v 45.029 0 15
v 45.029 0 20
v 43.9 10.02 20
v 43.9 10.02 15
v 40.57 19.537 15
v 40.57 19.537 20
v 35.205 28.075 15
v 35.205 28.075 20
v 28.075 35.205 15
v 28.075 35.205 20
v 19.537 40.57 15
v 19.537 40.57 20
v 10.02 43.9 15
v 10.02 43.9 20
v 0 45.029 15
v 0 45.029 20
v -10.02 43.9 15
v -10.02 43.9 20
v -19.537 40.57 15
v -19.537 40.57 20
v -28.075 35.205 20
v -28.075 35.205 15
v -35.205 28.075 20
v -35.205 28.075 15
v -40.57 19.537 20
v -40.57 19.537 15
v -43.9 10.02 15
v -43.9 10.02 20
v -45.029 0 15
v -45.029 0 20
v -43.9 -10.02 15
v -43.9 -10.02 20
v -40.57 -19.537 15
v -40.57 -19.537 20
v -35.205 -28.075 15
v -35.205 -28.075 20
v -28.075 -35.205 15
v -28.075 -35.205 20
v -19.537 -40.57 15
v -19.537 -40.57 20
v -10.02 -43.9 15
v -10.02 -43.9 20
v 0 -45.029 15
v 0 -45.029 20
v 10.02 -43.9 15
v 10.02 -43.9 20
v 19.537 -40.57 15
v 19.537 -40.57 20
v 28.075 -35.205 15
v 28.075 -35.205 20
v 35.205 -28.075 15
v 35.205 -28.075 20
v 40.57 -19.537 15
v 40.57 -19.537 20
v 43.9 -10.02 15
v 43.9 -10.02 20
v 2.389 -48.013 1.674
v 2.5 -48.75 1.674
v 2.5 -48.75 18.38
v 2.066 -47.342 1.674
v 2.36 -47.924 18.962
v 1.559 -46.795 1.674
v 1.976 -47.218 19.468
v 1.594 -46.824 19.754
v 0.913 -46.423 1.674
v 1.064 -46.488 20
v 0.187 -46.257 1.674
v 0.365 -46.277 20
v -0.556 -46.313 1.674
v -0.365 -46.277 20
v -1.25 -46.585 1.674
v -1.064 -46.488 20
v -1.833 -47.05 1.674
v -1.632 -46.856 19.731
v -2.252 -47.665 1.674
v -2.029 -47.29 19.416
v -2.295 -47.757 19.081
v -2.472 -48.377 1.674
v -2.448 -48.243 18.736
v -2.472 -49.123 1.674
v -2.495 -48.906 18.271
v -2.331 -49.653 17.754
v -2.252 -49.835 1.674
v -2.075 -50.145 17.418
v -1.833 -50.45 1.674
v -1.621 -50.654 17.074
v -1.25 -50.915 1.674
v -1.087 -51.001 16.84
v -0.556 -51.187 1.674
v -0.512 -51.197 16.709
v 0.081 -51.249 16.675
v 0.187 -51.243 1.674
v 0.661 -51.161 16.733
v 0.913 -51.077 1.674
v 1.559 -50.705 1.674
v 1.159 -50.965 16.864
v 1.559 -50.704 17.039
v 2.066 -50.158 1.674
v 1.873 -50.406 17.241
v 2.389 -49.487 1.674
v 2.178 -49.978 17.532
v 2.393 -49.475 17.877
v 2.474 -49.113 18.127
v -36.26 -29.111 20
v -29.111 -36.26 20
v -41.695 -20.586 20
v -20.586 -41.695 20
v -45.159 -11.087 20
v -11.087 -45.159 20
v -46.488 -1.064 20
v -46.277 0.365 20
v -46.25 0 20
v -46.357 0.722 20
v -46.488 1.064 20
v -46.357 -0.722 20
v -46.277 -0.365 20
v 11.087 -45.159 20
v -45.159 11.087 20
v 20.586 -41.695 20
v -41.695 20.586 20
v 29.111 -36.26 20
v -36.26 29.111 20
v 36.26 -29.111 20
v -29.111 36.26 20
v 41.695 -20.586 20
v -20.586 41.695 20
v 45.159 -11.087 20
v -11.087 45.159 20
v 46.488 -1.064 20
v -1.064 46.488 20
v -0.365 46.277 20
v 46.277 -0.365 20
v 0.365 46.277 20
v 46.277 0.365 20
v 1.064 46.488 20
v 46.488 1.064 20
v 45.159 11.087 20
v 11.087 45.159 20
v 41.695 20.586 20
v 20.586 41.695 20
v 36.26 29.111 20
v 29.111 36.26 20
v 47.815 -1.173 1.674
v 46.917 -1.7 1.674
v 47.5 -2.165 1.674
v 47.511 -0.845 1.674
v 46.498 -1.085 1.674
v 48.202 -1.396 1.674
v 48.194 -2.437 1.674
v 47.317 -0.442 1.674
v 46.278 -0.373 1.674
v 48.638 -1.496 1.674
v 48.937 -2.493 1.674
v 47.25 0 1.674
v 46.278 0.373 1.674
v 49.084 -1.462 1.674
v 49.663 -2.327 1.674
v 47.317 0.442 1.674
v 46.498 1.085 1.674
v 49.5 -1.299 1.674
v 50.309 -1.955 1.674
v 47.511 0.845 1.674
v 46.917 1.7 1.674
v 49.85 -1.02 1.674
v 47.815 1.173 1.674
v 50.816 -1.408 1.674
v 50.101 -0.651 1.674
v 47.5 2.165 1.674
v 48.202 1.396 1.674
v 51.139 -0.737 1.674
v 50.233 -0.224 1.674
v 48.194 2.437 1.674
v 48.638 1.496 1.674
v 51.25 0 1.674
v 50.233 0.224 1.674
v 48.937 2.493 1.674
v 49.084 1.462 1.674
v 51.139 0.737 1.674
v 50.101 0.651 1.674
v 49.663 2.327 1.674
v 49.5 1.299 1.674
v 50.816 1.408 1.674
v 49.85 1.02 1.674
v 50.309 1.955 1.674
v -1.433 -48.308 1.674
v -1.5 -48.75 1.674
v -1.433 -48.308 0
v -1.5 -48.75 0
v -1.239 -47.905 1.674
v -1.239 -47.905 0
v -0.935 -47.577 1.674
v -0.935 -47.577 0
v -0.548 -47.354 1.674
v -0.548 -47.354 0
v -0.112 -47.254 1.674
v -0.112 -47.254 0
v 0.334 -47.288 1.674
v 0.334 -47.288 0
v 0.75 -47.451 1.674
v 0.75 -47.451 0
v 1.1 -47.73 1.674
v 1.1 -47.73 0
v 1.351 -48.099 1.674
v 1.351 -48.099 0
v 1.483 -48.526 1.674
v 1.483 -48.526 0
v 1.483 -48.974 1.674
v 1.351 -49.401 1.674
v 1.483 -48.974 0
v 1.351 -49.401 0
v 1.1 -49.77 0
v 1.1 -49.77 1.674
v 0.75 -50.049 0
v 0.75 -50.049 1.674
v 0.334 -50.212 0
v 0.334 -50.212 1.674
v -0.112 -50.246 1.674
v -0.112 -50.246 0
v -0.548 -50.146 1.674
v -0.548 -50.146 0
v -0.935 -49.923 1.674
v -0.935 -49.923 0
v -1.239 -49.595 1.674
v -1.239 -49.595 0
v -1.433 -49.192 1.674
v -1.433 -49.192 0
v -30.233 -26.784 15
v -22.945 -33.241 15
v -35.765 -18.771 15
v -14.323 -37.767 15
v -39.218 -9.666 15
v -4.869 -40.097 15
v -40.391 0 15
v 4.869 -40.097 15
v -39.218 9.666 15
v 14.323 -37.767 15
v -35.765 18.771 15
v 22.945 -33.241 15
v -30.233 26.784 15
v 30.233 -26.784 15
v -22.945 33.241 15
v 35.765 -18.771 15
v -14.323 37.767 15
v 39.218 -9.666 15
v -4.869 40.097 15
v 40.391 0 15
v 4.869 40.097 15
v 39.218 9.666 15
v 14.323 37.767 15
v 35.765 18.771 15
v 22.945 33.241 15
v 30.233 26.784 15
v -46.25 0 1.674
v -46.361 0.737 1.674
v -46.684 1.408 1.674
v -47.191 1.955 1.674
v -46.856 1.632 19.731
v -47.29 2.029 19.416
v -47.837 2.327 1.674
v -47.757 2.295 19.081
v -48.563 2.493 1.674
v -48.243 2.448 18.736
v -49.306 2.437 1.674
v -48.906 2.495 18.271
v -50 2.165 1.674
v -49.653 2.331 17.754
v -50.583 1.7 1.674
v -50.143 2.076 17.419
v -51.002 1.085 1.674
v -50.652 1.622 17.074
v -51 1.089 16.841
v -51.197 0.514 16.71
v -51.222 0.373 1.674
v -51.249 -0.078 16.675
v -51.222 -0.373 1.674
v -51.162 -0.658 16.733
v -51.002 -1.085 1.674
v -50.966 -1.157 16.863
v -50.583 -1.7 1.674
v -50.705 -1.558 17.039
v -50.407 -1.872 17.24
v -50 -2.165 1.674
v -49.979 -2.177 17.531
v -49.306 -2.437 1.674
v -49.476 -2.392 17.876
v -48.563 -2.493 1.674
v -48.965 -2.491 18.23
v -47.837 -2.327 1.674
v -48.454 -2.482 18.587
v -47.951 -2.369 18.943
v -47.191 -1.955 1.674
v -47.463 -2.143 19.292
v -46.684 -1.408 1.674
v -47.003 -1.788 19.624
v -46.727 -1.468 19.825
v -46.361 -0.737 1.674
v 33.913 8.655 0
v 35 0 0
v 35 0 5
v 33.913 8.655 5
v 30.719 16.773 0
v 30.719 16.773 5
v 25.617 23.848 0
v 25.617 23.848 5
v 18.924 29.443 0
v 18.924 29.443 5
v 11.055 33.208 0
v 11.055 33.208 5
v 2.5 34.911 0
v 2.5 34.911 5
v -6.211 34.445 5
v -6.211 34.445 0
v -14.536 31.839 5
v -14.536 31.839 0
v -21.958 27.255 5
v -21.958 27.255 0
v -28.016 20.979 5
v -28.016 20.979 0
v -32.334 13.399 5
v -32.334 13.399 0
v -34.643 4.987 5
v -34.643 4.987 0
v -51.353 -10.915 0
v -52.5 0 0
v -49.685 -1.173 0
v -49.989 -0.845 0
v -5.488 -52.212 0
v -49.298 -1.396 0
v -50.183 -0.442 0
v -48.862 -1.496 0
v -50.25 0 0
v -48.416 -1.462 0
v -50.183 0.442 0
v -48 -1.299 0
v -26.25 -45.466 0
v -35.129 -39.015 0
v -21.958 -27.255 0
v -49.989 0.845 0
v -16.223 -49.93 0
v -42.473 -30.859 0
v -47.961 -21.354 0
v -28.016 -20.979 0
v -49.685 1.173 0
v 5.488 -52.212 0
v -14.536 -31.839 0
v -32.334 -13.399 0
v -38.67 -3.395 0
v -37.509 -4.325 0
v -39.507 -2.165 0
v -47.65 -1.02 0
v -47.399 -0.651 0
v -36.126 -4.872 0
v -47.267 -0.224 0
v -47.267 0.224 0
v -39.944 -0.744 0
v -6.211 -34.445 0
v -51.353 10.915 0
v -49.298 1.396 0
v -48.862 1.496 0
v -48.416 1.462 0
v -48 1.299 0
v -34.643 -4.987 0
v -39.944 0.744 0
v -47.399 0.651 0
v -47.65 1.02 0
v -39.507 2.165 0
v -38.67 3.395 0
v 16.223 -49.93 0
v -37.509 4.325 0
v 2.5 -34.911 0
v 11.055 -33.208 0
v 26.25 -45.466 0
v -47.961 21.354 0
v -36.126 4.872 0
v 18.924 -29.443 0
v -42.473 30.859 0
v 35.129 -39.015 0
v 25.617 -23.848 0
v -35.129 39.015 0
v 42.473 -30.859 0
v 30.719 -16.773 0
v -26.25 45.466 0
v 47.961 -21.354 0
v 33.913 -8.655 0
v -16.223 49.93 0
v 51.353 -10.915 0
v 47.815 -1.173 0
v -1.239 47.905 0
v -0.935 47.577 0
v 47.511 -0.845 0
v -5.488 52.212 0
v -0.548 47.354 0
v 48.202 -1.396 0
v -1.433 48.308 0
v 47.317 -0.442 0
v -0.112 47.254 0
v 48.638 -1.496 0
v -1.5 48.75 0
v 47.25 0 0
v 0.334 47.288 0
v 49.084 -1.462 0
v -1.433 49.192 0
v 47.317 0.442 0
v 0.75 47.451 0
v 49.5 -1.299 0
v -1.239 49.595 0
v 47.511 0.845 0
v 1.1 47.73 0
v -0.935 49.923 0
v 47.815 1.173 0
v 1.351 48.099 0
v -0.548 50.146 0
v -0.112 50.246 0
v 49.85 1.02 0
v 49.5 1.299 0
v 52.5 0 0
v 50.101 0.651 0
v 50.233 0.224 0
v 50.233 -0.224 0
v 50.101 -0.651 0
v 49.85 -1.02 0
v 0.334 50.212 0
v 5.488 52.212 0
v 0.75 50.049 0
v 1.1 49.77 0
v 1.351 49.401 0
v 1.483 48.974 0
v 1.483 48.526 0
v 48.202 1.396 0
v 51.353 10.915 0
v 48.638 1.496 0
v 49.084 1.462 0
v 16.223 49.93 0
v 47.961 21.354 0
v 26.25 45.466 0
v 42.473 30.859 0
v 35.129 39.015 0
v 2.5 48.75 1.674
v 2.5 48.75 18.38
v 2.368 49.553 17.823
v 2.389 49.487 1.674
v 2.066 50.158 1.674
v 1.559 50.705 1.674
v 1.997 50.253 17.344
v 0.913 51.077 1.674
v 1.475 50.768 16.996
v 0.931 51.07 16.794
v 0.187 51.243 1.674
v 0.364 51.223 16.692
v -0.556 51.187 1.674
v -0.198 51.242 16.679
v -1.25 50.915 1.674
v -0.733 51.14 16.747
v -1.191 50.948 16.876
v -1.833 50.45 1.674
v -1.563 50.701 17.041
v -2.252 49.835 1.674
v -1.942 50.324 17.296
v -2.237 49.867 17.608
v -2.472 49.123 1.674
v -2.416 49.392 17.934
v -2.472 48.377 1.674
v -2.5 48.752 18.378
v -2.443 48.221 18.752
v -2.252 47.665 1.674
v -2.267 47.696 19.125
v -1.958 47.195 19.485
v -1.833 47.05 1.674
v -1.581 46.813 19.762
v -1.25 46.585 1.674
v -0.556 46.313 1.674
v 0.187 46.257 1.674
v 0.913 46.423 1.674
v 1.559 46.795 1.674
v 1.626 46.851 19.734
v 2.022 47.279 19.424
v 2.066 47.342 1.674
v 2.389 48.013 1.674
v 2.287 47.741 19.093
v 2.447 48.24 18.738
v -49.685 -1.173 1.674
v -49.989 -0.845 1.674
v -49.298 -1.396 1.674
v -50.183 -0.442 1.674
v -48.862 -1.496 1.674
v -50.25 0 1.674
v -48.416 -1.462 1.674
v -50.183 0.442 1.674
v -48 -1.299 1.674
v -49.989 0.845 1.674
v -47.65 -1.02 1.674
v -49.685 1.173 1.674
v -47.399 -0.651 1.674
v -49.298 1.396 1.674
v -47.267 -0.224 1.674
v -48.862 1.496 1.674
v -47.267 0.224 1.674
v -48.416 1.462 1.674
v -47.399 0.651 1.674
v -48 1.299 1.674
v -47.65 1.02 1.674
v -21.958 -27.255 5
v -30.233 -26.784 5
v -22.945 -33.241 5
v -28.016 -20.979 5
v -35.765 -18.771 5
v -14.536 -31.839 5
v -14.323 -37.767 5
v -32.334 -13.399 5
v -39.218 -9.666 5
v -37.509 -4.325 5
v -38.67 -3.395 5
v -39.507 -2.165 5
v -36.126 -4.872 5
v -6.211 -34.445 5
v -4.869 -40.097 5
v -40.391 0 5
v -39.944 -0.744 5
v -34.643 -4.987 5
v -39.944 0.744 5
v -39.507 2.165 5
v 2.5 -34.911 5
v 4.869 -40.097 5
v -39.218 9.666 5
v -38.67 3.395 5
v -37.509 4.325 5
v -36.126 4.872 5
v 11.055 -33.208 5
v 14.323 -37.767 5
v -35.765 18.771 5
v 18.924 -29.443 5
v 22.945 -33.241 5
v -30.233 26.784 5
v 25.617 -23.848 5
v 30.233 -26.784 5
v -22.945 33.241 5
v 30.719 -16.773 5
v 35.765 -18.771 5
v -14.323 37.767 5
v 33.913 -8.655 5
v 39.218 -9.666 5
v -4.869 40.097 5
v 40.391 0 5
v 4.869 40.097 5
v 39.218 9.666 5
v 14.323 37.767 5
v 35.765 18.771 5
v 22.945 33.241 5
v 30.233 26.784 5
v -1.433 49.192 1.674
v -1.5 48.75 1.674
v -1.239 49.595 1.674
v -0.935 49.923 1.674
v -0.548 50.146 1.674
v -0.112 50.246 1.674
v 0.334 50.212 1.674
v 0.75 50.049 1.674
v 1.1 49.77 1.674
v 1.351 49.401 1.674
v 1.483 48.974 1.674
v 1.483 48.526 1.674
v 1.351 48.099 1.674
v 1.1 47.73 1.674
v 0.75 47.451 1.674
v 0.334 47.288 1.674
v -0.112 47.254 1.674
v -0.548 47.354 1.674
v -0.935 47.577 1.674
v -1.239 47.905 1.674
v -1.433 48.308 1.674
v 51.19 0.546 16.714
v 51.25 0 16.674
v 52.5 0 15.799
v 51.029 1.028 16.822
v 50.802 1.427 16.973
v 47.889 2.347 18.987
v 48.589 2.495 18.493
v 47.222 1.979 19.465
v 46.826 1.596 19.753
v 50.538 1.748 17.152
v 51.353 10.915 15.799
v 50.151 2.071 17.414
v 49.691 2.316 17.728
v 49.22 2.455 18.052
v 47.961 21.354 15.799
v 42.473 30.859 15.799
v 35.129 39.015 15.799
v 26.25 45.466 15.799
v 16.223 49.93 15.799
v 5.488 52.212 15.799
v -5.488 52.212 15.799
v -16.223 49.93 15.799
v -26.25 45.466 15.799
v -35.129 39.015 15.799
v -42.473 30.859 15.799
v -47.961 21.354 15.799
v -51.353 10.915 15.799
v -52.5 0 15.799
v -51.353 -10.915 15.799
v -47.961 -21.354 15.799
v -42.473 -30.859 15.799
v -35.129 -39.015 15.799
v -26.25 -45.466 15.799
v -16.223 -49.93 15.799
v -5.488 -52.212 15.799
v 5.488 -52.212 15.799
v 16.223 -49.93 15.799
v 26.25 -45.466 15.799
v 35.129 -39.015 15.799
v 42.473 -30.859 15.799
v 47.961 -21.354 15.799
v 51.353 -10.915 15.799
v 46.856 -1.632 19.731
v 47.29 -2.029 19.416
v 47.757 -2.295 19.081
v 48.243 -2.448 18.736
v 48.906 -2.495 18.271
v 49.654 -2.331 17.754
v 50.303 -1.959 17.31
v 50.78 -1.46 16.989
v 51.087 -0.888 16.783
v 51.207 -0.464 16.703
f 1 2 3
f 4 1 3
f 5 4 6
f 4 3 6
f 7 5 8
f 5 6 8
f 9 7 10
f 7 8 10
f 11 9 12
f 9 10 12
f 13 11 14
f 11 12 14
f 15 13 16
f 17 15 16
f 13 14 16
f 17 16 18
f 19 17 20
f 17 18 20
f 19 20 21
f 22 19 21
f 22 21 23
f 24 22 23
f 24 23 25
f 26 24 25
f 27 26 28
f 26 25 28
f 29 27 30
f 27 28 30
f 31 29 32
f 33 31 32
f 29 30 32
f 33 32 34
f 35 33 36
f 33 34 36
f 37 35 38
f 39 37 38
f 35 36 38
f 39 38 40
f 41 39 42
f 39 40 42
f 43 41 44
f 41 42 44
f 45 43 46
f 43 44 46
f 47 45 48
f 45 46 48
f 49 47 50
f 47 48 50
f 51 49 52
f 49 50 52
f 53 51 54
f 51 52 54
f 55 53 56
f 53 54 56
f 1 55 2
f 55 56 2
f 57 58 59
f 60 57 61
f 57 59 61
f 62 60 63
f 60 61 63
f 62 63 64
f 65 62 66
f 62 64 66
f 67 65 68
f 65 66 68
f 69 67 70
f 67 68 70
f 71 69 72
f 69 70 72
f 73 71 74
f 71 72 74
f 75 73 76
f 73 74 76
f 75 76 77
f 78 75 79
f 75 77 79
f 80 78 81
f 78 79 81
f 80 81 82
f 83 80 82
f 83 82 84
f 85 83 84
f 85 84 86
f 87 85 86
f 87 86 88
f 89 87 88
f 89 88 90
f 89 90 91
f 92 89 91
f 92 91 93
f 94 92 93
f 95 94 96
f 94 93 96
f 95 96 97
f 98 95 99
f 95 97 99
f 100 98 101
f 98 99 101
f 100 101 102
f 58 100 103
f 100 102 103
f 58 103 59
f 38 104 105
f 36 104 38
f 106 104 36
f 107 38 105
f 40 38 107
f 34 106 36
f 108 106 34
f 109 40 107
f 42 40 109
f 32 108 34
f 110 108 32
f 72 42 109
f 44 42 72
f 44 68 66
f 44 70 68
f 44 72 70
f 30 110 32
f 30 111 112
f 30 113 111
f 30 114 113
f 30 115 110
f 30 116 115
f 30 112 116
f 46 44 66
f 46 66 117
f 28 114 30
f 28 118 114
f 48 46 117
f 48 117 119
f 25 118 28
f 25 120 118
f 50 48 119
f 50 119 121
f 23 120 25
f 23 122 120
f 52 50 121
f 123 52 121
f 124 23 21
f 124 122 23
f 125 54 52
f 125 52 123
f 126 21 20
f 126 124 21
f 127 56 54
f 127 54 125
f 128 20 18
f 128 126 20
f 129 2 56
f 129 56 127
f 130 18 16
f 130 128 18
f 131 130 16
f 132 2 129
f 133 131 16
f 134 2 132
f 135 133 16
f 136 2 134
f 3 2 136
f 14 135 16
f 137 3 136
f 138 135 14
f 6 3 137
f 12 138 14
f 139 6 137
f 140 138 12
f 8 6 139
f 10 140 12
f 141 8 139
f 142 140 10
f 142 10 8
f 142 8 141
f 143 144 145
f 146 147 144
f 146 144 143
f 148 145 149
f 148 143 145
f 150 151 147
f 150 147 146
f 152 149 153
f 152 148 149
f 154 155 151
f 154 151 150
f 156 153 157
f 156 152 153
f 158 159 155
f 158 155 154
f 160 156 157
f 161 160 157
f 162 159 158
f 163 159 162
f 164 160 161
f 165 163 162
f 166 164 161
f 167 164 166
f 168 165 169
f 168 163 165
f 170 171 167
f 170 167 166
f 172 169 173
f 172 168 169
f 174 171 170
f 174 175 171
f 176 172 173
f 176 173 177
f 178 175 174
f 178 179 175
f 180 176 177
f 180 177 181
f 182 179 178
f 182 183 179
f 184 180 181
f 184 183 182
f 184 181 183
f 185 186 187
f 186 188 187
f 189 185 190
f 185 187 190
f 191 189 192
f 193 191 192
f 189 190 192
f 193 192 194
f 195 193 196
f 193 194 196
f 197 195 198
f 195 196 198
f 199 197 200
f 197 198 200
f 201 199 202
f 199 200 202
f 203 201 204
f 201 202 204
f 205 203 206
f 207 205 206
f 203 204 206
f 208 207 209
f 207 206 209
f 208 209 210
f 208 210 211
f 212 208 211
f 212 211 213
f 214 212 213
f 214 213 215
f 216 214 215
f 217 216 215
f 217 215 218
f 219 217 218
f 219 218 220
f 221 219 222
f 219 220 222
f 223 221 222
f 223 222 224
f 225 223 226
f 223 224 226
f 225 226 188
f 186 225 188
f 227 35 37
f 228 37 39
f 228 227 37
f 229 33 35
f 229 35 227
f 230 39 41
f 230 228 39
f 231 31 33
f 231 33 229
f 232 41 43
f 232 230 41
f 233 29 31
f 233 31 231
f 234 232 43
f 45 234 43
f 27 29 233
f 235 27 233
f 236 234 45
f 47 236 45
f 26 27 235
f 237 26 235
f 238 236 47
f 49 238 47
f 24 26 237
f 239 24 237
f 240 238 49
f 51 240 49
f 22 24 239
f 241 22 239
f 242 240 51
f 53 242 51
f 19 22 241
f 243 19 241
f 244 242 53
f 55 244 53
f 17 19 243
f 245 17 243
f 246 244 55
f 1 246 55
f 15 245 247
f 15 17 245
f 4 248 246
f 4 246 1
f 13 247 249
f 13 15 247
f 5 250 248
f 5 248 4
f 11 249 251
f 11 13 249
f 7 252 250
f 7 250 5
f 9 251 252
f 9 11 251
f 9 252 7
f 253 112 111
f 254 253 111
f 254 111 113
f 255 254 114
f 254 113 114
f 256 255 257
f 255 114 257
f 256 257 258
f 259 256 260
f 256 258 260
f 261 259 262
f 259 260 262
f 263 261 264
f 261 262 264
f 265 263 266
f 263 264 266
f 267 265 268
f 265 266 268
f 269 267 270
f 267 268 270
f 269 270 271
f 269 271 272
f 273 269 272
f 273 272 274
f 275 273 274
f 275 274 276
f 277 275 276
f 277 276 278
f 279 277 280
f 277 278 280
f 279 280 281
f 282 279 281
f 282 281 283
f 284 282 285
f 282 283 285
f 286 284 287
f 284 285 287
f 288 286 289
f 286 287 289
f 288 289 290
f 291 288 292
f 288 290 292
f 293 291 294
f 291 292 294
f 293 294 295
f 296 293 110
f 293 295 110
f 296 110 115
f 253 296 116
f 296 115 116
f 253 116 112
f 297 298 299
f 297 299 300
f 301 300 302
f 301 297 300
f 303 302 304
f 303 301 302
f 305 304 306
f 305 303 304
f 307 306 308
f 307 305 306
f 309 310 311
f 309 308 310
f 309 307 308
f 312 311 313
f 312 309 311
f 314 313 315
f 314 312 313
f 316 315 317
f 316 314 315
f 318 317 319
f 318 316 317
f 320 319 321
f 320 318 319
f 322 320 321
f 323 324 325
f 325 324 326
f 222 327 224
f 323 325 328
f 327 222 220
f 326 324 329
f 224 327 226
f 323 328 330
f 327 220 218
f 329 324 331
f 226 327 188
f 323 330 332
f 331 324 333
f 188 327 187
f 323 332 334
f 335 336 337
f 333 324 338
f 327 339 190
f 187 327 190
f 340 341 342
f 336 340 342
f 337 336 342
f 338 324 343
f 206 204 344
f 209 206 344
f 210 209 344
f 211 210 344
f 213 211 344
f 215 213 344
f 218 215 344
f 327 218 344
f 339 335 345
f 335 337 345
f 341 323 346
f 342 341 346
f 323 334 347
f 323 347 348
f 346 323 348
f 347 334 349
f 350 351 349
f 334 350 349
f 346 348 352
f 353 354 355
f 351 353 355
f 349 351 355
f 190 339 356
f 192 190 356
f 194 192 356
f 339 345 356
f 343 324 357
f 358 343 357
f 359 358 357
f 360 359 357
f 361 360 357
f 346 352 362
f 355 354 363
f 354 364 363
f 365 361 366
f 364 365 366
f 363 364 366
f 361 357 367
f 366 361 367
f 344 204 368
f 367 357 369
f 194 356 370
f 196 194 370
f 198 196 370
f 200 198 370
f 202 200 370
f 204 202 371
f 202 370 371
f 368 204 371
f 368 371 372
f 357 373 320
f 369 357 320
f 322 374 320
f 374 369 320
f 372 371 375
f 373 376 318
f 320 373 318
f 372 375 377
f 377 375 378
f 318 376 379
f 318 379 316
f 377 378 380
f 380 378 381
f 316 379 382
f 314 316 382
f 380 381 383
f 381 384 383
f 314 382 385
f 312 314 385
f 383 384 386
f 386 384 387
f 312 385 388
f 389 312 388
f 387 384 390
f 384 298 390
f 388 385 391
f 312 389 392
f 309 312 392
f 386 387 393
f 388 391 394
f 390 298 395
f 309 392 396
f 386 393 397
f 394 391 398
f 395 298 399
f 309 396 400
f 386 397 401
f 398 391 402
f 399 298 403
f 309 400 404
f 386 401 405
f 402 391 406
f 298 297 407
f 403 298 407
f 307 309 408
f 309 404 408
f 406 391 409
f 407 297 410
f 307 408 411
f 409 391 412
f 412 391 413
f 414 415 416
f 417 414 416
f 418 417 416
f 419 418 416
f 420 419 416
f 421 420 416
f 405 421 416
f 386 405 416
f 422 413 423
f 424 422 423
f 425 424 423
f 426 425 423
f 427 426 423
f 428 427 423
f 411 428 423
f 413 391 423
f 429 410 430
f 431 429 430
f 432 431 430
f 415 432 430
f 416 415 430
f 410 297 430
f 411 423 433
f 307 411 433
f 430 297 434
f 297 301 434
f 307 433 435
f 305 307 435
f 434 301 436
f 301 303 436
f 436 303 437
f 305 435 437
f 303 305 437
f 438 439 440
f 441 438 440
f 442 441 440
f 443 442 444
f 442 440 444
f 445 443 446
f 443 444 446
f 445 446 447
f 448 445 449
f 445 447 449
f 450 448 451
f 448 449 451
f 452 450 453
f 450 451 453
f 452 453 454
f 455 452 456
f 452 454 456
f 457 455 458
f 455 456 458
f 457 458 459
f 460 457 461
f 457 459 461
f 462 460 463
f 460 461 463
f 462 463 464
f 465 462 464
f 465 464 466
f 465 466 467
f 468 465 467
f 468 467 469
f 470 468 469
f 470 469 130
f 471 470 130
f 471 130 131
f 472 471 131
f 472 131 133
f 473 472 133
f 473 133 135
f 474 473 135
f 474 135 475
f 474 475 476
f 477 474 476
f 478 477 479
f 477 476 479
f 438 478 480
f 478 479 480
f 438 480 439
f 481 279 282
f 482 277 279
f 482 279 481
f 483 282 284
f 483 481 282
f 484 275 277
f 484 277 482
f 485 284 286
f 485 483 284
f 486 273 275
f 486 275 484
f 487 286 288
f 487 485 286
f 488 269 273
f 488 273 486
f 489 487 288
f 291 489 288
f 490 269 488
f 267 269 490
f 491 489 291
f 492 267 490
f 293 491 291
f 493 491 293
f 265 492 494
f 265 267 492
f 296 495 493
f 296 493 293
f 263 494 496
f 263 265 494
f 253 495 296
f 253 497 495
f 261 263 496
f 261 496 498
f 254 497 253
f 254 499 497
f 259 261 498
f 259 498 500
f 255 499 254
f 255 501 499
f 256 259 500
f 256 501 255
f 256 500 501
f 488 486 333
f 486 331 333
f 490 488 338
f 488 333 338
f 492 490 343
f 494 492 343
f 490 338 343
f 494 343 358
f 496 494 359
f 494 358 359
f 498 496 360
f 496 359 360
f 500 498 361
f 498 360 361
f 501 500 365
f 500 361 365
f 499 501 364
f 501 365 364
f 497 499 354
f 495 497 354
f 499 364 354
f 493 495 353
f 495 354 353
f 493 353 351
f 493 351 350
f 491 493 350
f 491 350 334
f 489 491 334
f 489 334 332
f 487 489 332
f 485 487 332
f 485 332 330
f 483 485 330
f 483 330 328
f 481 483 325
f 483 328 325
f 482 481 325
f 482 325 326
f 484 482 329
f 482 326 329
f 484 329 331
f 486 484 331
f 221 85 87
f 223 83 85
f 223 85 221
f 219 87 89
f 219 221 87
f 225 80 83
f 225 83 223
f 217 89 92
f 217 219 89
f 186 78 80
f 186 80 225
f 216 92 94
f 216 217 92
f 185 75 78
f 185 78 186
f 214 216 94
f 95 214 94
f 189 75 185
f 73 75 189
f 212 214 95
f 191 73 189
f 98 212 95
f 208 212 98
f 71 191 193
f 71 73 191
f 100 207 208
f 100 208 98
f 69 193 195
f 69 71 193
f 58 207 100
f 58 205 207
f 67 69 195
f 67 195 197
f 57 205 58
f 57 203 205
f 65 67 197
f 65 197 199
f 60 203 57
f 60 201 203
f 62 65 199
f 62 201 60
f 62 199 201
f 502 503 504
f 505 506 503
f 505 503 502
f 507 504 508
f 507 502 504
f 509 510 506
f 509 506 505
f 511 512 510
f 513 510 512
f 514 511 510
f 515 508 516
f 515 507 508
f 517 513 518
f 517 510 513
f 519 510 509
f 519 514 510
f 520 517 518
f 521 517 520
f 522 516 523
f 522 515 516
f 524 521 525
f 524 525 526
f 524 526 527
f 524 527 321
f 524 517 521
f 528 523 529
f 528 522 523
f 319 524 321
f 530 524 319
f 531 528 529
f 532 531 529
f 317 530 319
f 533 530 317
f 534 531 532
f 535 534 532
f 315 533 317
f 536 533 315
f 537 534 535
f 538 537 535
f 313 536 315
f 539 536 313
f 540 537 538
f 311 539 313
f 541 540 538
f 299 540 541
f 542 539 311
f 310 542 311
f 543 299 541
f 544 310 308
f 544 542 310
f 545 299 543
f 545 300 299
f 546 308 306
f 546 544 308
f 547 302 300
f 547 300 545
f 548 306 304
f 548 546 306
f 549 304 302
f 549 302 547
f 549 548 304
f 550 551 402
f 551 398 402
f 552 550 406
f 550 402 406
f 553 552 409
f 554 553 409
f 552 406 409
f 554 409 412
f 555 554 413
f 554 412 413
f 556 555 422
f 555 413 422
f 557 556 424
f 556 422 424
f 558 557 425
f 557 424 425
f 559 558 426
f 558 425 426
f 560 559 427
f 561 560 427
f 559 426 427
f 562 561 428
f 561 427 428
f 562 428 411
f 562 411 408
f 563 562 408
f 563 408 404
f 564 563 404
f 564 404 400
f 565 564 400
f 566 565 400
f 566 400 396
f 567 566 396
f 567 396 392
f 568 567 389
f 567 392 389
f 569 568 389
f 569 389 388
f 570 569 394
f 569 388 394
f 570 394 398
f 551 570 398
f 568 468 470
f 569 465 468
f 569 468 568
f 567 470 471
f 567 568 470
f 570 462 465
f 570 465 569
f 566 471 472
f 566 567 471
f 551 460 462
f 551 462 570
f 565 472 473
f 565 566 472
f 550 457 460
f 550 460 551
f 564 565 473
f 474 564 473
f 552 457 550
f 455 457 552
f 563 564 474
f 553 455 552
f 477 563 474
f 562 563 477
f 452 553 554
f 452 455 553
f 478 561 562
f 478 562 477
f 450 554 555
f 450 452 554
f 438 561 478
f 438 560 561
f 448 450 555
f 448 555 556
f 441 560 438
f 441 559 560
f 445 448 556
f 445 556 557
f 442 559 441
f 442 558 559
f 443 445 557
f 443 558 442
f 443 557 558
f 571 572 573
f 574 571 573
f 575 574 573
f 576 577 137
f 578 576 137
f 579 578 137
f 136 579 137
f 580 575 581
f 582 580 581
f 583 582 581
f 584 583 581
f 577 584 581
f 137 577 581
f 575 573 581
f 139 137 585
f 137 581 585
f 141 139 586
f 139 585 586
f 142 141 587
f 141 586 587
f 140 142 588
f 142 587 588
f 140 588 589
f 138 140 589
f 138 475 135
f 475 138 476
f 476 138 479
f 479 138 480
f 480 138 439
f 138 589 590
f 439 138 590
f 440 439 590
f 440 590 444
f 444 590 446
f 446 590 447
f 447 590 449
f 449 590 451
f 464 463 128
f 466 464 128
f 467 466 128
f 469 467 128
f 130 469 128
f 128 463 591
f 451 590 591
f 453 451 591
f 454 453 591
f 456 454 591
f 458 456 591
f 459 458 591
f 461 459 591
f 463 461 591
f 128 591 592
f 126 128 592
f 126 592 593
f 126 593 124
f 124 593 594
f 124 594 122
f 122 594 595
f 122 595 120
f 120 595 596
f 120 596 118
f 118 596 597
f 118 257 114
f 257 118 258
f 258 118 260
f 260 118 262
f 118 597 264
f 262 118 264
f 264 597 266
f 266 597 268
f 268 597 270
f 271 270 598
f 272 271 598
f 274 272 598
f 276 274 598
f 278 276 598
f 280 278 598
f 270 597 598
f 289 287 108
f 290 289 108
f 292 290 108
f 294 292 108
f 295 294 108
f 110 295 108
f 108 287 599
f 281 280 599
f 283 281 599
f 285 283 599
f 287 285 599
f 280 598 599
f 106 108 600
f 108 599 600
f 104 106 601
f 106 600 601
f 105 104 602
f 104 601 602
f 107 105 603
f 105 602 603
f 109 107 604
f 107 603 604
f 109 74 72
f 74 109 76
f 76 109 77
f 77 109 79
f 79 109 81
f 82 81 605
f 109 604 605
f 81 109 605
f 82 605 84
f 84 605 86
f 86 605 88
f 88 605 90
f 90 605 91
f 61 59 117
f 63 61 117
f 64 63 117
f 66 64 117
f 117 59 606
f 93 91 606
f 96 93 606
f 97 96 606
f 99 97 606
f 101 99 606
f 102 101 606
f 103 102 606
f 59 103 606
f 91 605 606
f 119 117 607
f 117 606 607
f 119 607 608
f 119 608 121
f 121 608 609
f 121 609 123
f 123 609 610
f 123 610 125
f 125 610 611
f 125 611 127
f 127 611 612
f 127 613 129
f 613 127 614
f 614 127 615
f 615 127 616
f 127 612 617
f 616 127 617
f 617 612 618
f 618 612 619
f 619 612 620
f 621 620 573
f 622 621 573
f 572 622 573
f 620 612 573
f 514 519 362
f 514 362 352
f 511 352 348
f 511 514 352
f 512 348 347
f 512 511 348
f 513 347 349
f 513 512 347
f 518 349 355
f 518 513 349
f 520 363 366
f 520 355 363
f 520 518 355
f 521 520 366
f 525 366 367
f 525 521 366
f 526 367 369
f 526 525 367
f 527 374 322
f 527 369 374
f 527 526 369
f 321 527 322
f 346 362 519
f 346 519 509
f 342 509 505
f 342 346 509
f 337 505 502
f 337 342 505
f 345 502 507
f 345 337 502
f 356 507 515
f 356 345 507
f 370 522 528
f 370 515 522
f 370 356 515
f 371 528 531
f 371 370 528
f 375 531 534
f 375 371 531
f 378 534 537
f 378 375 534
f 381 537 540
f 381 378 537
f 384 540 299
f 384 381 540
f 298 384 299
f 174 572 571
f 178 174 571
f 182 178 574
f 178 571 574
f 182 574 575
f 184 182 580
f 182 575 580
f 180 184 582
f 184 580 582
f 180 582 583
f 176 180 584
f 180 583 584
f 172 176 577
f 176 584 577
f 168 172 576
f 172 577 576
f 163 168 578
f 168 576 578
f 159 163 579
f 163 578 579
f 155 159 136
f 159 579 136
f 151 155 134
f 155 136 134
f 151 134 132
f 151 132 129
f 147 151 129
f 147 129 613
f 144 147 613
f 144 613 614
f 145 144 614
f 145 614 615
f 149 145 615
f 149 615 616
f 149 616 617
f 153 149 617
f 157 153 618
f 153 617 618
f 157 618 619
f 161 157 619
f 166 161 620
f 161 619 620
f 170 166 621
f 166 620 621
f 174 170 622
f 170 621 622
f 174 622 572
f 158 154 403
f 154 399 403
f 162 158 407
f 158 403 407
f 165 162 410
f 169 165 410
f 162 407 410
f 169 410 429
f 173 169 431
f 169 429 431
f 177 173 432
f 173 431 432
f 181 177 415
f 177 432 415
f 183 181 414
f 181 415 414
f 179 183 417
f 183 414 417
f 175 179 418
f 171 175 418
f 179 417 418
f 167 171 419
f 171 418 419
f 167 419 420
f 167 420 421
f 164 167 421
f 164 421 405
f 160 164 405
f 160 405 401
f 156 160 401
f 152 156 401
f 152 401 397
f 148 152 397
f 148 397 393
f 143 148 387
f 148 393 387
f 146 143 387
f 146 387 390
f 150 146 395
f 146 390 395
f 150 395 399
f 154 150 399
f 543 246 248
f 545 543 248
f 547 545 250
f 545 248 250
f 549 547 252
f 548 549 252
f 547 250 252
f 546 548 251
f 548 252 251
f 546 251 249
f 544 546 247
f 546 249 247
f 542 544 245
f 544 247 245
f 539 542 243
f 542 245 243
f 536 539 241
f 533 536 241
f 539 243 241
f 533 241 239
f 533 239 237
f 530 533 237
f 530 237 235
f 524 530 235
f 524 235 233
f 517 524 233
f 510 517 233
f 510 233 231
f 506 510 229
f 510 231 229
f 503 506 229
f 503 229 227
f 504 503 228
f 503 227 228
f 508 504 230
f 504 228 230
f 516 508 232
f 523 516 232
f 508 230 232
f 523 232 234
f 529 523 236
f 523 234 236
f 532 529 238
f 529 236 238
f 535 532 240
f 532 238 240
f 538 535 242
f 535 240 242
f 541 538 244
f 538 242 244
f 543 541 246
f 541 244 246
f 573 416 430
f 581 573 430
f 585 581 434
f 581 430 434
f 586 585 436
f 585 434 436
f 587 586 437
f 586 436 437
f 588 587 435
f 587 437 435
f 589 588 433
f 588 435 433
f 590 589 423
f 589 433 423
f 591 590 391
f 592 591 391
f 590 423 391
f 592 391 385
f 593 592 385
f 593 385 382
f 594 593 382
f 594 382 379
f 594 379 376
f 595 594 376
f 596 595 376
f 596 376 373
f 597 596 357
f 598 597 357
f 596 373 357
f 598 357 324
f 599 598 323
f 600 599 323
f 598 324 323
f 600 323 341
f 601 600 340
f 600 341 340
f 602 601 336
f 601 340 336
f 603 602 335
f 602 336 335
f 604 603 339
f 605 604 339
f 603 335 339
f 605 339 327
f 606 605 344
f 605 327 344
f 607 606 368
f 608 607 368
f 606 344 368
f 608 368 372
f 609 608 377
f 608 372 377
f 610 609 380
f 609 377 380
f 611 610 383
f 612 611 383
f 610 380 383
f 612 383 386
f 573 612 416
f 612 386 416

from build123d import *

# Parameters (mm, degrees)
F0_R           = 52.5
F0_R_2         = 35
F1_DEPTH       = 20
F2_DEPTH       = 20
F3_R           = 45.0292723638
F3_R_2         = 35
F4_DEPTH       = 5
F5_SIZE2       = 4.2012452293
F5_SIZE        = 6
F7_D           = 3
F7_START       = 3.3259859
F7_CBORE_D     = 5
F7_CBORE_DEPTH = 15
F8_R           = 40.3913127828
F9_DEPTH       = 10
F10_DEPTH      = 50


with BuildPart() as f1:
    # F0 (on Top) → F1 (new body)
    with BuildSketch(Plane.XY):
        Circle(F0_R)
        Circle(F0_R_2, mode=Mode.SUBTRACT)
        Circle(F0_R_2)
    extrude(amount=F1_DEPTH)

    # F0 (on Top) → F2 (cut)
    with BuildSketch(Plane.XY):
        Circle(F0_R_2)
    extrude(amount=F2_DEPTH, mode=Mode.SUBTRACT)

    # F3 (on face) → F4 (cut)
    with BuildSketch(Plane.XY.offset(20)):
        Circle(F3_R)
        Circle(F3_R_2, mode=Mode.SUBTRACT)
    extrude(amount=-F4_DEPTH, mode=Mode.SUBTRACT)

    # F5
    f5_edges = [f1.edges().sort_by_distance(p)[0] for p in [
        (-52.5, 0, 20),
    ]]
    f5_side = f1.faces().sort_by_distance((-51.015076, 0, 20))[0]
    chamfer(f5_edges, length=F5_SIZE, length2=F5_SIZE2, reference=f5_side)

    # F7 (through all)
    # its depths count from where the whole tool has entered the part; down to there all is cleared
    with Locations(Plane.XY.offset(20).offset(-F7_START)):
        with Locations((-48.75, 0), (0, -48.75), (48.75, 0), (0, 48.75)):
            CounterBoreHole(F7_D / 2, F7_CBORE_D / 2, F7_CBORE_DEPTH)

    # F8 (on face) → F9 (cut)
    with BuildSketch(Plane.XY.offset(15)):
        Circle(F8_R)
        with BuildLine():
            ThreePointArc((-34.6428571429, -4.9872285871), (-40, 0), (-34.6428571429, 4.9872285871))
            ThreePointArc((-34.6428571429, 4.9872285871), (2.5, 34.9106001094), (35, 0))
            ThreePointArc((35, 0), (2.5, -34.9106001094), (-34.6428571429, -4.9872285871))
        make_face(mode=Mode.SUBTRACT)
    extrude(amount=-F9_DEPTH, mode=Mode.SUBTRACT)

    # F10 (cut): a face of the model
    f10_faces = [f1.faces().sort_by_distance(p)[0] for p in [
        (-37.0564415312, 0, 15),
    ]]
    extrude(f10_faces, amount=-F10_DEPTH, mode=Mode.SUBTRACT)


solid = f1.part
